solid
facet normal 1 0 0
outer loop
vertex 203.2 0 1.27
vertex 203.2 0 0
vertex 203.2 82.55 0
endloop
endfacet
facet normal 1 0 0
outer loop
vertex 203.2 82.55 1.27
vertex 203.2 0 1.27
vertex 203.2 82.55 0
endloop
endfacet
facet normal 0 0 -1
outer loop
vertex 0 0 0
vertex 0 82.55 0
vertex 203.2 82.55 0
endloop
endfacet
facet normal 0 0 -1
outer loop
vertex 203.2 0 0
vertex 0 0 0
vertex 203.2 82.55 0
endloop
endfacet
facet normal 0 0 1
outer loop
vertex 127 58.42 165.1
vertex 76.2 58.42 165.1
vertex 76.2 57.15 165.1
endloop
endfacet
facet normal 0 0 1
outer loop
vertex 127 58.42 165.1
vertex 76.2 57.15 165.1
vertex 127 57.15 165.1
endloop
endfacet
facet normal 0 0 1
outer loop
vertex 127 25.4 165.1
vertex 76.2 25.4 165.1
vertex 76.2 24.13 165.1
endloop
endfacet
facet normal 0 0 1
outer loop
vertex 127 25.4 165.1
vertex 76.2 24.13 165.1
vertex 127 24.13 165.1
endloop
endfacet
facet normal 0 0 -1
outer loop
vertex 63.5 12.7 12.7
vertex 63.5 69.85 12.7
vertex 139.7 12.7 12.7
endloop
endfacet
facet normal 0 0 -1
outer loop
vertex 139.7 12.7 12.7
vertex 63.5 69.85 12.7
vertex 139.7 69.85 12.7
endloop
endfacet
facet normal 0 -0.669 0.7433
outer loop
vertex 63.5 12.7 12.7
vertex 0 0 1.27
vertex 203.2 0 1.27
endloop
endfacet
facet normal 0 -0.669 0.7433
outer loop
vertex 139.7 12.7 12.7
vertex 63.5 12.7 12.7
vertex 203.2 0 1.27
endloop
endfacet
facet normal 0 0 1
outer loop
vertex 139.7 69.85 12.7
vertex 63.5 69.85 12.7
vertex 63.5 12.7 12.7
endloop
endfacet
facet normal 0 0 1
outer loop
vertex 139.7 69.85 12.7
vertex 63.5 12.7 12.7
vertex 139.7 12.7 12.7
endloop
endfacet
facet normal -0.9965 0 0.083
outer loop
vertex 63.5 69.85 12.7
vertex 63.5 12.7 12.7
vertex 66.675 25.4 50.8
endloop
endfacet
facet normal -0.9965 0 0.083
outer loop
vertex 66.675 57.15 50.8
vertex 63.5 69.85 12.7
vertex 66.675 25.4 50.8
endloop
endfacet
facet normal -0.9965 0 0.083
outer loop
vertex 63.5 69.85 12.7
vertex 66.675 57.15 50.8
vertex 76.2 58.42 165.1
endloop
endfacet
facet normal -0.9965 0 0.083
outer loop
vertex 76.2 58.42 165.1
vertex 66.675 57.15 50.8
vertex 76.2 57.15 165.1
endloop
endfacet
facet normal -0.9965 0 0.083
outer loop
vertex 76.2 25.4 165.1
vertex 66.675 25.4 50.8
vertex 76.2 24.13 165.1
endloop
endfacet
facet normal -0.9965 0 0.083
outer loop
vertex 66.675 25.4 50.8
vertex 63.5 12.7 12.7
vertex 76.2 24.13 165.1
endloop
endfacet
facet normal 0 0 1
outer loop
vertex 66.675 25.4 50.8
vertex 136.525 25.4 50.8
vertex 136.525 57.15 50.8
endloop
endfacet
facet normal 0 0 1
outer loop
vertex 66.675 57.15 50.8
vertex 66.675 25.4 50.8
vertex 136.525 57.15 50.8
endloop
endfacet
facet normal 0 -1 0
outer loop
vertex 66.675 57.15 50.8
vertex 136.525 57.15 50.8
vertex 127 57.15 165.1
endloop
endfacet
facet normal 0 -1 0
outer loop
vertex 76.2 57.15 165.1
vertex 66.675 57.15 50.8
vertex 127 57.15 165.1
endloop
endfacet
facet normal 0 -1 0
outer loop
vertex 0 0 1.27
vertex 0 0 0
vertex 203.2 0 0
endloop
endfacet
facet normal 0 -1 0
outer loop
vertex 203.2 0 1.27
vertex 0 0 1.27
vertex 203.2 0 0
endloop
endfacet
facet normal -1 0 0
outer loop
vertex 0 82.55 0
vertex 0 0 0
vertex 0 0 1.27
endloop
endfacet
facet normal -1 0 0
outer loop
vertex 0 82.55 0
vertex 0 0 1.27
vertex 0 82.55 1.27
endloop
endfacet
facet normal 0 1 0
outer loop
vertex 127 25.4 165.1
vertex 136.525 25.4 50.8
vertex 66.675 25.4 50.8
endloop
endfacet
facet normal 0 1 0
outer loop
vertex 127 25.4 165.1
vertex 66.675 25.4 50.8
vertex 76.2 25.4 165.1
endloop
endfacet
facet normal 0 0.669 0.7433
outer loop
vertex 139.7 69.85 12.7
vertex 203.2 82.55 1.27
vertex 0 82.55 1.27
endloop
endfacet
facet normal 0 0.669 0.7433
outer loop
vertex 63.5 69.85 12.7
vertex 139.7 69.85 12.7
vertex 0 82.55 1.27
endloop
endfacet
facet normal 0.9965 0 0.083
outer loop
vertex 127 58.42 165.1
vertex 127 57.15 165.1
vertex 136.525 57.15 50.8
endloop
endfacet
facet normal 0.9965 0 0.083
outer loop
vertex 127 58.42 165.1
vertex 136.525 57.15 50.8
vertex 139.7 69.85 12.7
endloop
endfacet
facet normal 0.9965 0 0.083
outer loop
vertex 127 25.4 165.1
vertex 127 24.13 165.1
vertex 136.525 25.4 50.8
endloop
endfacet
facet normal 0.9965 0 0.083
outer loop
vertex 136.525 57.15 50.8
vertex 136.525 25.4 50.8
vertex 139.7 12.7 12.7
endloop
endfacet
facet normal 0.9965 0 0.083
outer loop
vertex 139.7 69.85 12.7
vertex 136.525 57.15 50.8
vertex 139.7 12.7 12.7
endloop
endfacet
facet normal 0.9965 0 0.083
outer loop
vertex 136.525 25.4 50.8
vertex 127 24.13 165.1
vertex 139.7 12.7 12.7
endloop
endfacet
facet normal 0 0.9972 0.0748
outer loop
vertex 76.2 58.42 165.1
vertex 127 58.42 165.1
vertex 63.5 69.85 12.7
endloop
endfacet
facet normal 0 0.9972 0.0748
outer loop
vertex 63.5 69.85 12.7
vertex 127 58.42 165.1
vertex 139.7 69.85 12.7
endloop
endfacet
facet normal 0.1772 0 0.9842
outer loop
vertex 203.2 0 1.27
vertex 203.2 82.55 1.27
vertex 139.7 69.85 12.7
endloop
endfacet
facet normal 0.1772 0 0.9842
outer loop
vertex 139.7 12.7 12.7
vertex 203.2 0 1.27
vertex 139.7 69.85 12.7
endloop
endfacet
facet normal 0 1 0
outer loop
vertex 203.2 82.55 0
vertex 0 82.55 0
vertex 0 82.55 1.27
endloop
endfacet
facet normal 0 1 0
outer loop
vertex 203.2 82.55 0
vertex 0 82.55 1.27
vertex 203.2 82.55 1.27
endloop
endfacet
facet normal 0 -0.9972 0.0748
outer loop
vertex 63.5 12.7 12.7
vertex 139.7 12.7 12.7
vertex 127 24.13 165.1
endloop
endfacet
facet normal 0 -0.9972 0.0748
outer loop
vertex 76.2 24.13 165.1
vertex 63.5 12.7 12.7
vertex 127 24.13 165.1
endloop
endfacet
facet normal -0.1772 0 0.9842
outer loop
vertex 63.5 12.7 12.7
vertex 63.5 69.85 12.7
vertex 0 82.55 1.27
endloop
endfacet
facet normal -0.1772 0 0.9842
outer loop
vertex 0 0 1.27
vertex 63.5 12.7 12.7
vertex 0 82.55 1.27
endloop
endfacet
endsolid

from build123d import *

# Parameters (mm, degrees)
F0_W      = 203.2
F0_H      = 82.55
F1_DEPTH  = 12.7
F3_DEPTH  = 203.2
F5_DEPTH  = 82.55
F6_W      = 76.2
F6_H      = 57.15
F7_DEPTH  = 152.4
F8_W      = 31.75
F8_H      = 114.3
F9_DEPTH  = 76.2
F12_DEPTH = 76.2
F13_DEPTH = 57.15


with BuildPart() as f1:
    # F0 (on Top) → F1 (new body)
    with BuildSketch(Plane.XY):
        with Locations((101.6, 41.275)):
            Rectangle(F0_W, F0_H)
    extrude(amount=F1_DEPTH)

    # F2 (on face) → F3 (cut)
    with BuildSketch(Plane.YZ.offset(203.2)):
        Polygon((12.7, 12.7), (0, 12.7), (0, 1.27), align=None)
        Polygon((82.55, 1.27), (82.55, 12.7), (69.85, 12.7), align=None)
    extrude(amount=-F3_DEPTH, mode=Mode.SUBTRACT)

    # F4 (on face) → F5 (cut)
    with BuildSketch(Plane(origin=(0, 82.55, 0), x_dir=(-1, 0, 0), z_dir=(0, 1, 0))):
        Polygon((-203.2, 12.7), (-203.2, 1.27), (-139.7, 12.7), align=None)
        Polygon((-63.5, 12.7), (0, 1.27), (0, 12.7), align=None)
    extrude(amount=-F5_DEPTH, mode=Mode.SUBTRACT)


with BuildPart() as f7:
    # F6 (on face) → F7 (new body)
    with BuildSketch(Plane.XY.offset(12.7)):
        with Locations((101.6, 41.275)):
            Rectangle(F6_W, F6_H)
    extrude(amount=F7_DEPTH)

    # F8 (on face) → F9 (cut)
    with BuildSketch(Plane.YZ.offset(139.7)):
        with Locations((41.275, 107.95)):
            Rectangle(F8_W, F8_H)
    extrude(amount=-F9_DEPTH, mode=Mode.SUBTRACT)

    # F10 (on face) → F12 (cut)
    with BuildSketch(Plane.YZ.offset(139.7)):
        Polygon((12.7, 165.1), (12.7, 12.7), (24.13, 165.1), align=None)
        Polygon((58.42, 165.1), (69.85, 12.7), (69.85, 165.1), align=None)
    extrude(amount=-F12_DEPTH, mode=Mode.SUBTRACT)

    # F11 (on face) → F13 (cut)
    with BuildSketch(Plane.XZ.offset(-12.7)):
        Polygon((76.2, 165.1), (63.5, 165.1), (63.5, 12.7), align=None)
        Polygon((139.7, 12.7), (139.7, 165.1), (127, 165.1), align=None)
    extrude(amount=-F13_DEPTH, mode=Mode.SUBTRACT)


solid = Compound([f1.part, f7.part])
